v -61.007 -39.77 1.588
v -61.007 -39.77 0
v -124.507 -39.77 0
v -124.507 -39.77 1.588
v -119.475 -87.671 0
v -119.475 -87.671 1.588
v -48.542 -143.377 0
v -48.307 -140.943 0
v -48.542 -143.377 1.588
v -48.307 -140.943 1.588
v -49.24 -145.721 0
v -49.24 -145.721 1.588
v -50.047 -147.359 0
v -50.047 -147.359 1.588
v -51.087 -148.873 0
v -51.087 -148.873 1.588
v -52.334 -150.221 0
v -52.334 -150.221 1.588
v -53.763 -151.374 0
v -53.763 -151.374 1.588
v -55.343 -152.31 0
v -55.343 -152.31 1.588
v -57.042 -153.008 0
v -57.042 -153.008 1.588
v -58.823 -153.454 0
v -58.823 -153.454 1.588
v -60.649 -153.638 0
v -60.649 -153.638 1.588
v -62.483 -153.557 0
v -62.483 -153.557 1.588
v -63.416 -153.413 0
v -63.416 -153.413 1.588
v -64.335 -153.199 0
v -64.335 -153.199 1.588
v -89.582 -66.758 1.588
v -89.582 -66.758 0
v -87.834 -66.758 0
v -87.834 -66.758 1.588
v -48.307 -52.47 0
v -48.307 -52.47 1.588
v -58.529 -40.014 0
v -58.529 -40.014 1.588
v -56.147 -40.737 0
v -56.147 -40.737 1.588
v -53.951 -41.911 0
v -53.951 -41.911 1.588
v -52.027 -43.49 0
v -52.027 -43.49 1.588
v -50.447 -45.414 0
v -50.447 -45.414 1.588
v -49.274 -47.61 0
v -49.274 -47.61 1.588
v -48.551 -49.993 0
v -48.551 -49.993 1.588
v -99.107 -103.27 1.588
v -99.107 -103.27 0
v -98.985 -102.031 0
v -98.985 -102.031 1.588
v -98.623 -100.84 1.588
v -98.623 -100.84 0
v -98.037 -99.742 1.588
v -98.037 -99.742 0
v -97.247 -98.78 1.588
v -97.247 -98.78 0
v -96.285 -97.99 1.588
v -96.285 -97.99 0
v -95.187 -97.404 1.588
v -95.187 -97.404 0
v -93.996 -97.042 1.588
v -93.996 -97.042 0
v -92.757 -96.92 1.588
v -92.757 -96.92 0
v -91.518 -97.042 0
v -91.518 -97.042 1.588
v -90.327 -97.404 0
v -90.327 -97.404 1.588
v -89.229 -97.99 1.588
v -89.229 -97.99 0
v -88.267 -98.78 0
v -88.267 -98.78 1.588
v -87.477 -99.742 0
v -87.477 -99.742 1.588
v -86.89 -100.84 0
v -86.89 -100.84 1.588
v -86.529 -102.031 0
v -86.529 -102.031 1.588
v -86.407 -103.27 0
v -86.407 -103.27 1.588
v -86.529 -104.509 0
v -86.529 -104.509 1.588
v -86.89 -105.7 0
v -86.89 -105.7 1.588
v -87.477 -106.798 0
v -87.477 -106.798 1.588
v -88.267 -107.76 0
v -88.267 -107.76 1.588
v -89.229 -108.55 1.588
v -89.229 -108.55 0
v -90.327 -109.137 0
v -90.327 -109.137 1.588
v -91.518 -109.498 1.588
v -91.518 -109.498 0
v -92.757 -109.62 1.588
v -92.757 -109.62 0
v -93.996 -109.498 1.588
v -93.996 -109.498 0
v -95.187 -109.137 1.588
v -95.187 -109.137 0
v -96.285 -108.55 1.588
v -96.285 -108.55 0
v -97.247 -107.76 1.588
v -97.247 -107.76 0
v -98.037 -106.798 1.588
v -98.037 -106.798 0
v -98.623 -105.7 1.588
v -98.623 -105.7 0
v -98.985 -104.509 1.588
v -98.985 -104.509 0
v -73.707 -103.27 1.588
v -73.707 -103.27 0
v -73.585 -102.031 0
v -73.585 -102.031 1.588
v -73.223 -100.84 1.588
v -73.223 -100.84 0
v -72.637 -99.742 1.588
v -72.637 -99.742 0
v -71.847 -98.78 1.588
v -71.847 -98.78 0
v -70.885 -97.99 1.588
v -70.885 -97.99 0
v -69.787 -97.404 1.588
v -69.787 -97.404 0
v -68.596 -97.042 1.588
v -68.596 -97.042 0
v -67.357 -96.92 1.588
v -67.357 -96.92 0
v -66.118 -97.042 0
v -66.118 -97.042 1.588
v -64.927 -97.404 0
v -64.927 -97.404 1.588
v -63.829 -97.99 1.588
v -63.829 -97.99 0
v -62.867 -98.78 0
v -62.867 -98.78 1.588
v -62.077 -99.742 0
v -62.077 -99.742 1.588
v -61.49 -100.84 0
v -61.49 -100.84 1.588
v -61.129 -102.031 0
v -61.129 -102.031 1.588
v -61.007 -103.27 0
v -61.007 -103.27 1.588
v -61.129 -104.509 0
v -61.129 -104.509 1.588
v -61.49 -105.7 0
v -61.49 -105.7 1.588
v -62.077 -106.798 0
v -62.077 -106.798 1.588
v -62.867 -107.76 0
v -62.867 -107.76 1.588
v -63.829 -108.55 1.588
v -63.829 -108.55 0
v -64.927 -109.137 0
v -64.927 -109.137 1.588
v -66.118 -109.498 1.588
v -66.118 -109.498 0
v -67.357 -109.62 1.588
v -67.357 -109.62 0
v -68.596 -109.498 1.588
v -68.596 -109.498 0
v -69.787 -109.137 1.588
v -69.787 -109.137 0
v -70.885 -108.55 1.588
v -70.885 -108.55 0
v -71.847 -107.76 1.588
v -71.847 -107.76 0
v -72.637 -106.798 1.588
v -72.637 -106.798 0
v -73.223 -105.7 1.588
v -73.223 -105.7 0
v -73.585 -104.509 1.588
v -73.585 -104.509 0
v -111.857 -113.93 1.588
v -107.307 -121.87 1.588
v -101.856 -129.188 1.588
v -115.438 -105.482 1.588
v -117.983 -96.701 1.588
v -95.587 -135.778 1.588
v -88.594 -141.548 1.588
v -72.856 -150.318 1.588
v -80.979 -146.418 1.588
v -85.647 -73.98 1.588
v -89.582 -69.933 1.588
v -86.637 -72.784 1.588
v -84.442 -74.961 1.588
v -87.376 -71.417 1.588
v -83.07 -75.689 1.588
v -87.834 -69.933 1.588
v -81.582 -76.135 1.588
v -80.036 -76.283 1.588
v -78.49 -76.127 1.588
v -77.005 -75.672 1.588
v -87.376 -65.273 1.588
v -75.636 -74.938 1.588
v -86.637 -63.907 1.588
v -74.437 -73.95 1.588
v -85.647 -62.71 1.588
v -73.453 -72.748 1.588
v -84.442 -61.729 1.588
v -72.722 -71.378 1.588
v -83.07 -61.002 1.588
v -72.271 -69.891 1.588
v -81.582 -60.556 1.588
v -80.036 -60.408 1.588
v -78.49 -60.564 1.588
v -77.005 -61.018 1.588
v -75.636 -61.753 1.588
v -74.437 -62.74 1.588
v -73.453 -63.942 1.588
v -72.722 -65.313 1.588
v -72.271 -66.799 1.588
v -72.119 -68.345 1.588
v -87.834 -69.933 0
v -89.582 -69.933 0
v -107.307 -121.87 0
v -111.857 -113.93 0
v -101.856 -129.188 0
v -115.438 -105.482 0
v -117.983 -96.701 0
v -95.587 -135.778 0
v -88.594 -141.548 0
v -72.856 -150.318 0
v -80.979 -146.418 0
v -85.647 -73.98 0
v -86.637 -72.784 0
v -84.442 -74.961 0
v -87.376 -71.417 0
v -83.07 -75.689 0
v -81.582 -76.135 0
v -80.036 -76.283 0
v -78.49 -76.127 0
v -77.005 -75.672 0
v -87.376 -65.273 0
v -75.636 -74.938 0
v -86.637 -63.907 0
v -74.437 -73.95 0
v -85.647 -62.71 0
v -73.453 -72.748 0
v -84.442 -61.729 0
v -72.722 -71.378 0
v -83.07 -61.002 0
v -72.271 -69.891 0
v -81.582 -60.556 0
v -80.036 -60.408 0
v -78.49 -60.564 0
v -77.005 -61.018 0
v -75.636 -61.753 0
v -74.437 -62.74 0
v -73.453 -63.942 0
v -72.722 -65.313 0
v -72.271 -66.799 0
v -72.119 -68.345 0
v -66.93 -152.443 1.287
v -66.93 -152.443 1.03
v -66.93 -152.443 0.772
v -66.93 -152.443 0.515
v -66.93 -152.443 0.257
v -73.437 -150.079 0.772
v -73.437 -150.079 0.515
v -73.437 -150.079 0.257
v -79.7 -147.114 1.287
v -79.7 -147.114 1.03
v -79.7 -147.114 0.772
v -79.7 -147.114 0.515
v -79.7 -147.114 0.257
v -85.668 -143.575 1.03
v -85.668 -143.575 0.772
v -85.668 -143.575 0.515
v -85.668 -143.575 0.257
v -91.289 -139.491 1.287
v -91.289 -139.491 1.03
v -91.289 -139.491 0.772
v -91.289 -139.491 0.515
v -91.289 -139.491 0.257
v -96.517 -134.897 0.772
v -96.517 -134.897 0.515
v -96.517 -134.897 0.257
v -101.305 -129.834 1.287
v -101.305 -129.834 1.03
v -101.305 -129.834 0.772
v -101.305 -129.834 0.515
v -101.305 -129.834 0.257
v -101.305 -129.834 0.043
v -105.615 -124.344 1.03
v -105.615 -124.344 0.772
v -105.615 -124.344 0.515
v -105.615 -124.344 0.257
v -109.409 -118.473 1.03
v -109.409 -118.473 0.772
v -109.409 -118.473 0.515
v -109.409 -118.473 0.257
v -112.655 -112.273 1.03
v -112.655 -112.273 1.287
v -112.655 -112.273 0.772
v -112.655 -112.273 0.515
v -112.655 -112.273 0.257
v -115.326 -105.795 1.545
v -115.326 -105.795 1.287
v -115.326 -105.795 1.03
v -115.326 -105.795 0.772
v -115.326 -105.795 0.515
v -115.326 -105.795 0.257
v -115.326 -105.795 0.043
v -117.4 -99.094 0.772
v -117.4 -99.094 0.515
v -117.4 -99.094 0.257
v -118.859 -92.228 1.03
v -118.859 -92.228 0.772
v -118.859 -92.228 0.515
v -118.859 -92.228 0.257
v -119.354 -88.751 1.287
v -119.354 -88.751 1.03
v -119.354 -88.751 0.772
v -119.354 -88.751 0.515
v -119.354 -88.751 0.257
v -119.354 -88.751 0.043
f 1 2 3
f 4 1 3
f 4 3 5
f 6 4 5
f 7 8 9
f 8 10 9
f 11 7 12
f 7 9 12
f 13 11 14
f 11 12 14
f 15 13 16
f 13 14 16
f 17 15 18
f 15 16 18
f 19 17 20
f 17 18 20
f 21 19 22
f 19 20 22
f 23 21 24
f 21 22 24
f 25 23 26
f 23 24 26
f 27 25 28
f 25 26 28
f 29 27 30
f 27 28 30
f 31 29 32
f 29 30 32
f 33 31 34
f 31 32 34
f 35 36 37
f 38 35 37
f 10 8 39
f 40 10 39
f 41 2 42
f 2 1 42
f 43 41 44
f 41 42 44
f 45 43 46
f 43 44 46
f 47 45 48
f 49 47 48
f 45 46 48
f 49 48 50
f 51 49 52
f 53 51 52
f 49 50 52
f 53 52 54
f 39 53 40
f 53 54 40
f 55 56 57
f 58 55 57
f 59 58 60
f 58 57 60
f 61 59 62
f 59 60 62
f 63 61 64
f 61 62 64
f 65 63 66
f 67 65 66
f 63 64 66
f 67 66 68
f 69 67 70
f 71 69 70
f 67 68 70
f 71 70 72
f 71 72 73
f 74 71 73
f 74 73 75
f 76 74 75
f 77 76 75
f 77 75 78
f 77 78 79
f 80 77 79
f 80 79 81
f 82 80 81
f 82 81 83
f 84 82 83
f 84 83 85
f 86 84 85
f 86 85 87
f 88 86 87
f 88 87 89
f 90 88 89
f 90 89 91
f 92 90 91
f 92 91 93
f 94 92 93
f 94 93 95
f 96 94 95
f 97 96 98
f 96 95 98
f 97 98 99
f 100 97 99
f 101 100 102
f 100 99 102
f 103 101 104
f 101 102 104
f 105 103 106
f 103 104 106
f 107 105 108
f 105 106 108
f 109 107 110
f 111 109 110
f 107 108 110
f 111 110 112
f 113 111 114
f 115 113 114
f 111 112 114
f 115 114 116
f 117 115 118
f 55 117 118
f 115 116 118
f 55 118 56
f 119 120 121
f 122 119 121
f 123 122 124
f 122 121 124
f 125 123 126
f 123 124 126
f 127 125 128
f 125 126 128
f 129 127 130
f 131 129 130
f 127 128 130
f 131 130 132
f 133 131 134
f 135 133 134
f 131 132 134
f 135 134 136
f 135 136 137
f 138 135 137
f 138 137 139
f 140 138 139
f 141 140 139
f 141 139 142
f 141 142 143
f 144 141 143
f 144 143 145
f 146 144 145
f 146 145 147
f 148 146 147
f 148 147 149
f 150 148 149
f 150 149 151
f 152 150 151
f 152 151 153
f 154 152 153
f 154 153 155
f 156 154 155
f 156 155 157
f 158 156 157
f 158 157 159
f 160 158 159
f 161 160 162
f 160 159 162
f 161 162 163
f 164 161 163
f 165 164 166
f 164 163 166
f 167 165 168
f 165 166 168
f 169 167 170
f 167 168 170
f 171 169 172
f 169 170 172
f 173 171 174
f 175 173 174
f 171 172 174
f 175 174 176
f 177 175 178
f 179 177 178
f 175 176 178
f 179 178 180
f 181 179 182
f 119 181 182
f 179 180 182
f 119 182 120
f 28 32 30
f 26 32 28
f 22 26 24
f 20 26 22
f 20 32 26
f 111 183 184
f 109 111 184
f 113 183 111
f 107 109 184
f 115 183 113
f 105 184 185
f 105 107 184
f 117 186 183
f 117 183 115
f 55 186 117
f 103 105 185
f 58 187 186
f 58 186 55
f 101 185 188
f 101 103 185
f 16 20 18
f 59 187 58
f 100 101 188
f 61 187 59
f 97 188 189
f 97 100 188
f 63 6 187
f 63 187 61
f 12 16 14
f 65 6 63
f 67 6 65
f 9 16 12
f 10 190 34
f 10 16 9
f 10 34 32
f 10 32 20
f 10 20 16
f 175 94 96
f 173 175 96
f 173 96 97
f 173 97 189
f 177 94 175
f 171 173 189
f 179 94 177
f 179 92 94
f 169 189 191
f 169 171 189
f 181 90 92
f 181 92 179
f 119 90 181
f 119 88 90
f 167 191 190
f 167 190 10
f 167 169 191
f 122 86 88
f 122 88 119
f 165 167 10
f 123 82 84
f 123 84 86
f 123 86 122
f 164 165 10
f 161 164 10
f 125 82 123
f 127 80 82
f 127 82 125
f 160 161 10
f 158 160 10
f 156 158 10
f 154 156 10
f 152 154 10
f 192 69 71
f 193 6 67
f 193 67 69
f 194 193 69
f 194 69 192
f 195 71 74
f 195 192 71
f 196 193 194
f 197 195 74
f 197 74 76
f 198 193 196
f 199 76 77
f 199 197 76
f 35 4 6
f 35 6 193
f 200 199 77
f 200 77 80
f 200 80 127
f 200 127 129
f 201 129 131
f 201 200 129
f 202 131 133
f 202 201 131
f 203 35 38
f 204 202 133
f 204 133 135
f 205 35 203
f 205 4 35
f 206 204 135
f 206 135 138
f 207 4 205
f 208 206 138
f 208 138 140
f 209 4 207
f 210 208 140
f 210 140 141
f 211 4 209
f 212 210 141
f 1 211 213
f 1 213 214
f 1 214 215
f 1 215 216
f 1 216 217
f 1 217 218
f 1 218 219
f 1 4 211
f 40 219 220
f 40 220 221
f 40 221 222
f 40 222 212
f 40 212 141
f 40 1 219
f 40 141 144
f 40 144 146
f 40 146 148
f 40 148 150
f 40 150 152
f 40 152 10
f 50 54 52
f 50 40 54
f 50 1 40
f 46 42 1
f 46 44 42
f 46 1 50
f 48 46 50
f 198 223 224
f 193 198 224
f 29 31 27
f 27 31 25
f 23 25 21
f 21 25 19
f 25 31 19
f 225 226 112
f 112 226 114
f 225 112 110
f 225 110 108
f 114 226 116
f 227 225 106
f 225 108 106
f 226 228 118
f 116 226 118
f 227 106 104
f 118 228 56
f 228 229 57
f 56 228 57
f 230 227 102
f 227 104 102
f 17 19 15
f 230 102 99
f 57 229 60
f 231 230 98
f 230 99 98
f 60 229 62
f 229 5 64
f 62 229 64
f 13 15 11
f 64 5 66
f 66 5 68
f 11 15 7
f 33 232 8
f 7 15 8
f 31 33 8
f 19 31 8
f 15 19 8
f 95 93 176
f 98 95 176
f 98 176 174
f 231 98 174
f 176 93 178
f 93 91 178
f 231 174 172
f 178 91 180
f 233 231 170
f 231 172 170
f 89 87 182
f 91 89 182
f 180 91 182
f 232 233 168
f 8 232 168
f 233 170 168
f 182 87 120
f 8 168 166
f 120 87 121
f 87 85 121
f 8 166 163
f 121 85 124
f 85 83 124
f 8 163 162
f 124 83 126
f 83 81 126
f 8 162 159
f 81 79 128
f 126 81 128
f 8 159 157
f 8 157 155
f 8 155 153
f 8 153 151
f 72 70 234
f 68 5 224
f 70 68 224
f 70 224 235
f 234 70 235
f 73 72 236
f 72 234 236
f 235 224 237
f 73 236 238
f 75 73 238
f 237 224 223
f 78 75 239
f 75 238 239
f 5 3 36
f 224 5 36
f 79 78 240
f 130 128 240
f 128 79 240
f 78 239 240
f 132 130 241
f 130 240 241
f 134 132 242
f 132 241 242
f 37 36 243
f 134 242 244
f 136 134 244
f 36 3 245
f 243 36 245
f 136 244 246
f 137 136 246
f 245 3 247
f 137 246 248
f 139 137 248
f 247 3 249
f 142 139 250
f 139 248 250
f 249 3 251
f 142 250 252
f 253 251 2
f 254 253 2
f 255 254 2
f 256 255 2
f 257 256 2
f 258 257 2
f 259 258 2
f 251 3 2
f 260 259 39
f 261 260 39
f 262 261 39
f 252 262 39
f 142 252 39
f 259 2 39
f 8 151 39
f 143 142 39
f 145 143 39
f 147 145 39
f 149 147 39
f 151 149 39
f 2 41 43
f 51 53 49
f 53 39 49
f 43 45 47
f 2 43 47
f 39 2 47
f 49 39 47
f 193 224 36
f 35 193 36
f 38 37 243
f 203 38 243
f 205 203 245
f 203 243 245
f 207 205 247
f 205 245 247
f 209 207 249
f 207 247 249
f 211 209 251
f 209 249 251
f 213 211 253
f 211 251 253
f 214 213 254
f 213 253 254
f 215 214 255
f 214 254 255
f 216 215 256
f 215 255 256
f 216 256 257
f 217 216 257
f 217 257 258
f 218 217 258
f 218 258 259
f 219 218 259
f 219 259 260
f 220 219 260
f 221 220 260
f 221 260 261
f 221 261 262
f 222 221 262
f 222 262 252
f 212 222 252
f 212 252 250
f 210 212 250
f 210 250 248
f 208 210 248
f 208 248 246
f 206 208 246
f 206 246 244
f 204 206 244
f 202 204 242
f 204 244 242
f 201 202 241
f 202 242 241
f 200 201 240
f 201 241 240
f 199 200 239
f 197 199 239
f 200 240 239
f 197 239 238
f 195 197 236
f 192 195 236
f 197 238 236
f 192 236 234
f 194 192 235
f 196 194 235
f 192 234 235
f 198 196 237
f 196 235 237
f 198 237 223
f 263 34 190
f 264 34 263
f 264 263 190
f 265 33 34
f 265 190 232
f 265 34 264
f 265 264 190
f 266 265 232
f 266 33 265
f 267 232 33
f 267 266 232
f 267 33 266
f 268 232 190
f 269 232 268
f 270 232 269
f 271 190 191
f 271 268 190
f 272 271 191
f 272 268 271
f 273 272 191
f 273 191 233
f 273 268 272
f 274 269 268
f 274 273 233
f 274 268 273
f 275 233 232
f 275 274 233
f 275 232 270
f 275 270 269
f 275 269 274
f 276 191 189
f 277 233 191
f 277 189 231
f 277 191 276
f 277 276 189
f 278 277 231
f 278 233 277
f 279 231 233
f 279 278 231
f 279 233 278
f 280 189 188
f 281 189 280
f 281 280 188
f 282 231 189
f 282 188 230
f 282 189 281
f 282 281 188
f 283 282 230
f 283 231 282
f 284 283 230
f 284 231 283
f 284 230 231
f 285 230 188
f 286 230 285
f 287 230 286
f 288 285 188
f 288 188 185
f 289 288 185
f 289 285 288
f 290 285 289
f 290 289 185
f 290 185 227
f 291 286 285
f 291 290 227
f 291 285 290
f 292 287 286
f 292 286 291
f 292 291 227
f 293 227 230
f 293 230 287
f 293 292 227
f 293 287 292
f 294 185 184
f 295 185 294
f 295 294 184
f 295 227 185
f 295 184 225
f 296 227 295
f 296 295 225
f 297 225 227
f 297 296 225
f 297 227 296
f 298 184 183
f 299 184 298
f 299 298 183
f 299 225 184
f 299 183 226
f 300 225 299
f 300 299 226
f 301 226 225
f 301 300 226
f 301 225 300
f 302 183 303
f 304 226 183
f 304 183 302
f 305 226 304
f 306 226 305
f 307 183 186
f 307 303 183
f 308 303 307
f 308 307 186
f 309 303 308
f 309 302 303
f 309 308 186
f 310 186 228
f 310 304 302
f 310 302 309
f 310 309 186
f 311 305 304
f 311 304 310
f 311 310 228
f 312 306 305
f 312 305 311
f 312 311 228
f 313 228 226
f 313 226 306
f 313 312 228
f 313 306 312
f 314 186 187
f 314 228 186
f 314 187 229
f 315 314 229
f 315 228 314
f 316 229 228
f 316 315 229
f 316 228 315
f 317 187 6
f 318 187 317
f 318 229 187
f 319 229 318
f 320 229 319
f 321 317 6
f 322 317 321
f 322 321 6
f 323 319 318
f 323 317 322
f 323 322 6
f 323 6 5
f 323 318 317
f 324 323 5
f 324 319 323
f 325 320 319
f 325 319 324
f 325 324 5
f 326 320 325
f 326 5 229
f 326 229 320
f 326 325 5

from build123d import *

# Parameters (mm, degrees)
BOSS_EXTRUDE1_DEPTH = 1.5875
SKETCH2_R           = 6.35
CUT_EXTRUDE1_DEPTH  = 200.716179568
FILLET1_R           = 12.7


with BuildPart() as part:
    # Sketch1 → Boss-Extrude1 (new body)
    with BuildSketch(Plane.XY):
        with BuildLine():
            Line((-124.506849283, -39.770231507), (-119.474980228, -87.671358692))
            add(Edge.make_bspline(
                [(-56.3280252, -154.902468877), (-56.346476044, -154.899600353), (-56.402884517, -154.890830617), (-56.611080033, -154.858170111), (-57.104136424, -154.77889222), (-58.050896577, -154.617474356), (-60.354414853, -154.185740423), (-63.388938266, -153.485638357), (-67.010951192, -152.444549796), (-70.219086063, -151.362943176), (-73.446369967, -150.103845866), (-76.612996137, -148.694555998), (-79.712216879, -147.138105291), (-82.737433419, -145.437839357), (-85.682209143, -143.597409415), (-88.540283438, -141.620764011), (-91.305584556, -139.512139868), (-93.972242223, -137.276052336), (-96.534599628, -134.917285272), (-98.987224972, -132.440880464), (-101.324922461, -129.852126585), (-103.542742806, -127.156547725), (-105.635993175, -124.359891507), (-107.600246622, -121.468116813), (-109.431350973, -118.487381131), (-111.125437151, -115.424027557), (-112.678926942, -112.284571448), (-114.088540191, -109.075686767), (-115.351301396, -105.804192123), (-116.464545718, -102.477036535), (-117.425924357, -99.101284939), (-118.233409317, -95.684103469), (-118.885297518, -92.232744524), (-119.242744402, -89.7206526), (-119.408317309, -88.286030012), (-119.442476963, -87.975658316), (-119.45920335, -87.820433155), (-119.468609128, -87.731931499), (-119.473836089, -87.682236519), (-119.474980228, -87.671358692)],
                knots=[0, 0, 0, 0, 0.000570634, 0.001744558, 0.006440232, 0.015831442, 0.031091736, 0.078042667, 0.110904268, 0.146108785, 0.181308268, 0.216502219, 0.251690199, 0.286871835, 0.322046819, 0.357214911, 0.392375937, 0.427529794, 0.462676442, 0.497815906, 0.532948271, 0.568073682, 0.603192339, 0.638304491, 0.673410436, 0.708510515, 0.743605108, 0.77869463, 0.813779526, 0.84886027, 0.88393736, 0.919011312, 0.954082662, 0.989151956, 0.994996677, 0.997334555, 0.998503491, 0.999672426, 1, 1, 1, 1], degree=3))
            Line((-56.3280252, -154.902468877), (-48.306849283, -156.147611733))
            Line((-48.306849283, -156.147611733), (-48.306849283, -39.770231507))
            Line((-48.306849283, -39.770231507), (-124.506849283, -39.770231507))
        make_face()
    extrude(amount=BOSS_EXTRUDE1_DEPTH)

    # Sketch2 → Cut-Extrude1 (cut, through all)
    with BuildSketch(Plane(origin=(0, 0, 0), x_dir=(-1, 0, 0), z_dir=(0, 0, -1))):
        with Locations((67.356849283, -103.270231507)):
            Circle(SKETCH2_R)
        with Locations((92.756849283, -103.270231507)):
            Circle(SKETCH2_R)
        with BuildLine():
            ThreePointArc((87.994349283, -68.345231507), (87.954154998, -67.547441621), (87.833979216, -66.757731507))
            Line((87.833979216, -66.757731507), (86.406849283, -66.757731507))
            Line((86.406849283, -66.757731507), (86.406849283, -69.932731507))
            Line((86.406849283, -69.932731507), (87.833979216, -69.932731507))
            ThreePointArc((87.833979216, -69.932731507), (87.954154998, -69.143021393), (87.994349283, -68.345231507))
        make_face()
        with BuildLine():
            Line((86.406849283, -66.757731507), (87.833979216, -66.757731507))
            ThreePointArc((87.833979216, -66.757731507), (72.119349283, -68.345231507), (87.833979216, -69.932731507))
            Line((87.833979216, -69.932731507), (86.406849283, -69.932731507))
            Line((86.406849283, -69.932731507), (86.406849283, -66.757731507))
        make_face()
        with BuildLine():
            Line((89.581849283, -69.932731507), (89.581849283, -66.757731507))
            Line((89.581849283, -66.757731507), (87.833979216, -66.757731507))
            ThreePointArc((87.833979216, -66.757731507), (87.954154998, -67.547441621), (87.994349283, -68.345231507))
            ThreePointArc((87.994349283, -68.345231507), (87.954154998, -69.143021393), (87.833979216, -69.932731507))
            Line((87.833979216, -69.932731507), (89.581849283, -69.932731507))
        make_face()
    extrude(amount=-CUT_EXTRUDE1_DEPTH, mode=Mode.SUBTRACT)

    # Fillet1
    fillet1_edges = [part.edges().sort_by_distance(p)[0] for p in [
        (-48.306849283, -39.770231507, 0.79375),
        (-48.306849283, -156.147611733, 0.79375),
    ]]
    fillet(fillet1_edges, radius=FILLET1_R)


solid = part.part
